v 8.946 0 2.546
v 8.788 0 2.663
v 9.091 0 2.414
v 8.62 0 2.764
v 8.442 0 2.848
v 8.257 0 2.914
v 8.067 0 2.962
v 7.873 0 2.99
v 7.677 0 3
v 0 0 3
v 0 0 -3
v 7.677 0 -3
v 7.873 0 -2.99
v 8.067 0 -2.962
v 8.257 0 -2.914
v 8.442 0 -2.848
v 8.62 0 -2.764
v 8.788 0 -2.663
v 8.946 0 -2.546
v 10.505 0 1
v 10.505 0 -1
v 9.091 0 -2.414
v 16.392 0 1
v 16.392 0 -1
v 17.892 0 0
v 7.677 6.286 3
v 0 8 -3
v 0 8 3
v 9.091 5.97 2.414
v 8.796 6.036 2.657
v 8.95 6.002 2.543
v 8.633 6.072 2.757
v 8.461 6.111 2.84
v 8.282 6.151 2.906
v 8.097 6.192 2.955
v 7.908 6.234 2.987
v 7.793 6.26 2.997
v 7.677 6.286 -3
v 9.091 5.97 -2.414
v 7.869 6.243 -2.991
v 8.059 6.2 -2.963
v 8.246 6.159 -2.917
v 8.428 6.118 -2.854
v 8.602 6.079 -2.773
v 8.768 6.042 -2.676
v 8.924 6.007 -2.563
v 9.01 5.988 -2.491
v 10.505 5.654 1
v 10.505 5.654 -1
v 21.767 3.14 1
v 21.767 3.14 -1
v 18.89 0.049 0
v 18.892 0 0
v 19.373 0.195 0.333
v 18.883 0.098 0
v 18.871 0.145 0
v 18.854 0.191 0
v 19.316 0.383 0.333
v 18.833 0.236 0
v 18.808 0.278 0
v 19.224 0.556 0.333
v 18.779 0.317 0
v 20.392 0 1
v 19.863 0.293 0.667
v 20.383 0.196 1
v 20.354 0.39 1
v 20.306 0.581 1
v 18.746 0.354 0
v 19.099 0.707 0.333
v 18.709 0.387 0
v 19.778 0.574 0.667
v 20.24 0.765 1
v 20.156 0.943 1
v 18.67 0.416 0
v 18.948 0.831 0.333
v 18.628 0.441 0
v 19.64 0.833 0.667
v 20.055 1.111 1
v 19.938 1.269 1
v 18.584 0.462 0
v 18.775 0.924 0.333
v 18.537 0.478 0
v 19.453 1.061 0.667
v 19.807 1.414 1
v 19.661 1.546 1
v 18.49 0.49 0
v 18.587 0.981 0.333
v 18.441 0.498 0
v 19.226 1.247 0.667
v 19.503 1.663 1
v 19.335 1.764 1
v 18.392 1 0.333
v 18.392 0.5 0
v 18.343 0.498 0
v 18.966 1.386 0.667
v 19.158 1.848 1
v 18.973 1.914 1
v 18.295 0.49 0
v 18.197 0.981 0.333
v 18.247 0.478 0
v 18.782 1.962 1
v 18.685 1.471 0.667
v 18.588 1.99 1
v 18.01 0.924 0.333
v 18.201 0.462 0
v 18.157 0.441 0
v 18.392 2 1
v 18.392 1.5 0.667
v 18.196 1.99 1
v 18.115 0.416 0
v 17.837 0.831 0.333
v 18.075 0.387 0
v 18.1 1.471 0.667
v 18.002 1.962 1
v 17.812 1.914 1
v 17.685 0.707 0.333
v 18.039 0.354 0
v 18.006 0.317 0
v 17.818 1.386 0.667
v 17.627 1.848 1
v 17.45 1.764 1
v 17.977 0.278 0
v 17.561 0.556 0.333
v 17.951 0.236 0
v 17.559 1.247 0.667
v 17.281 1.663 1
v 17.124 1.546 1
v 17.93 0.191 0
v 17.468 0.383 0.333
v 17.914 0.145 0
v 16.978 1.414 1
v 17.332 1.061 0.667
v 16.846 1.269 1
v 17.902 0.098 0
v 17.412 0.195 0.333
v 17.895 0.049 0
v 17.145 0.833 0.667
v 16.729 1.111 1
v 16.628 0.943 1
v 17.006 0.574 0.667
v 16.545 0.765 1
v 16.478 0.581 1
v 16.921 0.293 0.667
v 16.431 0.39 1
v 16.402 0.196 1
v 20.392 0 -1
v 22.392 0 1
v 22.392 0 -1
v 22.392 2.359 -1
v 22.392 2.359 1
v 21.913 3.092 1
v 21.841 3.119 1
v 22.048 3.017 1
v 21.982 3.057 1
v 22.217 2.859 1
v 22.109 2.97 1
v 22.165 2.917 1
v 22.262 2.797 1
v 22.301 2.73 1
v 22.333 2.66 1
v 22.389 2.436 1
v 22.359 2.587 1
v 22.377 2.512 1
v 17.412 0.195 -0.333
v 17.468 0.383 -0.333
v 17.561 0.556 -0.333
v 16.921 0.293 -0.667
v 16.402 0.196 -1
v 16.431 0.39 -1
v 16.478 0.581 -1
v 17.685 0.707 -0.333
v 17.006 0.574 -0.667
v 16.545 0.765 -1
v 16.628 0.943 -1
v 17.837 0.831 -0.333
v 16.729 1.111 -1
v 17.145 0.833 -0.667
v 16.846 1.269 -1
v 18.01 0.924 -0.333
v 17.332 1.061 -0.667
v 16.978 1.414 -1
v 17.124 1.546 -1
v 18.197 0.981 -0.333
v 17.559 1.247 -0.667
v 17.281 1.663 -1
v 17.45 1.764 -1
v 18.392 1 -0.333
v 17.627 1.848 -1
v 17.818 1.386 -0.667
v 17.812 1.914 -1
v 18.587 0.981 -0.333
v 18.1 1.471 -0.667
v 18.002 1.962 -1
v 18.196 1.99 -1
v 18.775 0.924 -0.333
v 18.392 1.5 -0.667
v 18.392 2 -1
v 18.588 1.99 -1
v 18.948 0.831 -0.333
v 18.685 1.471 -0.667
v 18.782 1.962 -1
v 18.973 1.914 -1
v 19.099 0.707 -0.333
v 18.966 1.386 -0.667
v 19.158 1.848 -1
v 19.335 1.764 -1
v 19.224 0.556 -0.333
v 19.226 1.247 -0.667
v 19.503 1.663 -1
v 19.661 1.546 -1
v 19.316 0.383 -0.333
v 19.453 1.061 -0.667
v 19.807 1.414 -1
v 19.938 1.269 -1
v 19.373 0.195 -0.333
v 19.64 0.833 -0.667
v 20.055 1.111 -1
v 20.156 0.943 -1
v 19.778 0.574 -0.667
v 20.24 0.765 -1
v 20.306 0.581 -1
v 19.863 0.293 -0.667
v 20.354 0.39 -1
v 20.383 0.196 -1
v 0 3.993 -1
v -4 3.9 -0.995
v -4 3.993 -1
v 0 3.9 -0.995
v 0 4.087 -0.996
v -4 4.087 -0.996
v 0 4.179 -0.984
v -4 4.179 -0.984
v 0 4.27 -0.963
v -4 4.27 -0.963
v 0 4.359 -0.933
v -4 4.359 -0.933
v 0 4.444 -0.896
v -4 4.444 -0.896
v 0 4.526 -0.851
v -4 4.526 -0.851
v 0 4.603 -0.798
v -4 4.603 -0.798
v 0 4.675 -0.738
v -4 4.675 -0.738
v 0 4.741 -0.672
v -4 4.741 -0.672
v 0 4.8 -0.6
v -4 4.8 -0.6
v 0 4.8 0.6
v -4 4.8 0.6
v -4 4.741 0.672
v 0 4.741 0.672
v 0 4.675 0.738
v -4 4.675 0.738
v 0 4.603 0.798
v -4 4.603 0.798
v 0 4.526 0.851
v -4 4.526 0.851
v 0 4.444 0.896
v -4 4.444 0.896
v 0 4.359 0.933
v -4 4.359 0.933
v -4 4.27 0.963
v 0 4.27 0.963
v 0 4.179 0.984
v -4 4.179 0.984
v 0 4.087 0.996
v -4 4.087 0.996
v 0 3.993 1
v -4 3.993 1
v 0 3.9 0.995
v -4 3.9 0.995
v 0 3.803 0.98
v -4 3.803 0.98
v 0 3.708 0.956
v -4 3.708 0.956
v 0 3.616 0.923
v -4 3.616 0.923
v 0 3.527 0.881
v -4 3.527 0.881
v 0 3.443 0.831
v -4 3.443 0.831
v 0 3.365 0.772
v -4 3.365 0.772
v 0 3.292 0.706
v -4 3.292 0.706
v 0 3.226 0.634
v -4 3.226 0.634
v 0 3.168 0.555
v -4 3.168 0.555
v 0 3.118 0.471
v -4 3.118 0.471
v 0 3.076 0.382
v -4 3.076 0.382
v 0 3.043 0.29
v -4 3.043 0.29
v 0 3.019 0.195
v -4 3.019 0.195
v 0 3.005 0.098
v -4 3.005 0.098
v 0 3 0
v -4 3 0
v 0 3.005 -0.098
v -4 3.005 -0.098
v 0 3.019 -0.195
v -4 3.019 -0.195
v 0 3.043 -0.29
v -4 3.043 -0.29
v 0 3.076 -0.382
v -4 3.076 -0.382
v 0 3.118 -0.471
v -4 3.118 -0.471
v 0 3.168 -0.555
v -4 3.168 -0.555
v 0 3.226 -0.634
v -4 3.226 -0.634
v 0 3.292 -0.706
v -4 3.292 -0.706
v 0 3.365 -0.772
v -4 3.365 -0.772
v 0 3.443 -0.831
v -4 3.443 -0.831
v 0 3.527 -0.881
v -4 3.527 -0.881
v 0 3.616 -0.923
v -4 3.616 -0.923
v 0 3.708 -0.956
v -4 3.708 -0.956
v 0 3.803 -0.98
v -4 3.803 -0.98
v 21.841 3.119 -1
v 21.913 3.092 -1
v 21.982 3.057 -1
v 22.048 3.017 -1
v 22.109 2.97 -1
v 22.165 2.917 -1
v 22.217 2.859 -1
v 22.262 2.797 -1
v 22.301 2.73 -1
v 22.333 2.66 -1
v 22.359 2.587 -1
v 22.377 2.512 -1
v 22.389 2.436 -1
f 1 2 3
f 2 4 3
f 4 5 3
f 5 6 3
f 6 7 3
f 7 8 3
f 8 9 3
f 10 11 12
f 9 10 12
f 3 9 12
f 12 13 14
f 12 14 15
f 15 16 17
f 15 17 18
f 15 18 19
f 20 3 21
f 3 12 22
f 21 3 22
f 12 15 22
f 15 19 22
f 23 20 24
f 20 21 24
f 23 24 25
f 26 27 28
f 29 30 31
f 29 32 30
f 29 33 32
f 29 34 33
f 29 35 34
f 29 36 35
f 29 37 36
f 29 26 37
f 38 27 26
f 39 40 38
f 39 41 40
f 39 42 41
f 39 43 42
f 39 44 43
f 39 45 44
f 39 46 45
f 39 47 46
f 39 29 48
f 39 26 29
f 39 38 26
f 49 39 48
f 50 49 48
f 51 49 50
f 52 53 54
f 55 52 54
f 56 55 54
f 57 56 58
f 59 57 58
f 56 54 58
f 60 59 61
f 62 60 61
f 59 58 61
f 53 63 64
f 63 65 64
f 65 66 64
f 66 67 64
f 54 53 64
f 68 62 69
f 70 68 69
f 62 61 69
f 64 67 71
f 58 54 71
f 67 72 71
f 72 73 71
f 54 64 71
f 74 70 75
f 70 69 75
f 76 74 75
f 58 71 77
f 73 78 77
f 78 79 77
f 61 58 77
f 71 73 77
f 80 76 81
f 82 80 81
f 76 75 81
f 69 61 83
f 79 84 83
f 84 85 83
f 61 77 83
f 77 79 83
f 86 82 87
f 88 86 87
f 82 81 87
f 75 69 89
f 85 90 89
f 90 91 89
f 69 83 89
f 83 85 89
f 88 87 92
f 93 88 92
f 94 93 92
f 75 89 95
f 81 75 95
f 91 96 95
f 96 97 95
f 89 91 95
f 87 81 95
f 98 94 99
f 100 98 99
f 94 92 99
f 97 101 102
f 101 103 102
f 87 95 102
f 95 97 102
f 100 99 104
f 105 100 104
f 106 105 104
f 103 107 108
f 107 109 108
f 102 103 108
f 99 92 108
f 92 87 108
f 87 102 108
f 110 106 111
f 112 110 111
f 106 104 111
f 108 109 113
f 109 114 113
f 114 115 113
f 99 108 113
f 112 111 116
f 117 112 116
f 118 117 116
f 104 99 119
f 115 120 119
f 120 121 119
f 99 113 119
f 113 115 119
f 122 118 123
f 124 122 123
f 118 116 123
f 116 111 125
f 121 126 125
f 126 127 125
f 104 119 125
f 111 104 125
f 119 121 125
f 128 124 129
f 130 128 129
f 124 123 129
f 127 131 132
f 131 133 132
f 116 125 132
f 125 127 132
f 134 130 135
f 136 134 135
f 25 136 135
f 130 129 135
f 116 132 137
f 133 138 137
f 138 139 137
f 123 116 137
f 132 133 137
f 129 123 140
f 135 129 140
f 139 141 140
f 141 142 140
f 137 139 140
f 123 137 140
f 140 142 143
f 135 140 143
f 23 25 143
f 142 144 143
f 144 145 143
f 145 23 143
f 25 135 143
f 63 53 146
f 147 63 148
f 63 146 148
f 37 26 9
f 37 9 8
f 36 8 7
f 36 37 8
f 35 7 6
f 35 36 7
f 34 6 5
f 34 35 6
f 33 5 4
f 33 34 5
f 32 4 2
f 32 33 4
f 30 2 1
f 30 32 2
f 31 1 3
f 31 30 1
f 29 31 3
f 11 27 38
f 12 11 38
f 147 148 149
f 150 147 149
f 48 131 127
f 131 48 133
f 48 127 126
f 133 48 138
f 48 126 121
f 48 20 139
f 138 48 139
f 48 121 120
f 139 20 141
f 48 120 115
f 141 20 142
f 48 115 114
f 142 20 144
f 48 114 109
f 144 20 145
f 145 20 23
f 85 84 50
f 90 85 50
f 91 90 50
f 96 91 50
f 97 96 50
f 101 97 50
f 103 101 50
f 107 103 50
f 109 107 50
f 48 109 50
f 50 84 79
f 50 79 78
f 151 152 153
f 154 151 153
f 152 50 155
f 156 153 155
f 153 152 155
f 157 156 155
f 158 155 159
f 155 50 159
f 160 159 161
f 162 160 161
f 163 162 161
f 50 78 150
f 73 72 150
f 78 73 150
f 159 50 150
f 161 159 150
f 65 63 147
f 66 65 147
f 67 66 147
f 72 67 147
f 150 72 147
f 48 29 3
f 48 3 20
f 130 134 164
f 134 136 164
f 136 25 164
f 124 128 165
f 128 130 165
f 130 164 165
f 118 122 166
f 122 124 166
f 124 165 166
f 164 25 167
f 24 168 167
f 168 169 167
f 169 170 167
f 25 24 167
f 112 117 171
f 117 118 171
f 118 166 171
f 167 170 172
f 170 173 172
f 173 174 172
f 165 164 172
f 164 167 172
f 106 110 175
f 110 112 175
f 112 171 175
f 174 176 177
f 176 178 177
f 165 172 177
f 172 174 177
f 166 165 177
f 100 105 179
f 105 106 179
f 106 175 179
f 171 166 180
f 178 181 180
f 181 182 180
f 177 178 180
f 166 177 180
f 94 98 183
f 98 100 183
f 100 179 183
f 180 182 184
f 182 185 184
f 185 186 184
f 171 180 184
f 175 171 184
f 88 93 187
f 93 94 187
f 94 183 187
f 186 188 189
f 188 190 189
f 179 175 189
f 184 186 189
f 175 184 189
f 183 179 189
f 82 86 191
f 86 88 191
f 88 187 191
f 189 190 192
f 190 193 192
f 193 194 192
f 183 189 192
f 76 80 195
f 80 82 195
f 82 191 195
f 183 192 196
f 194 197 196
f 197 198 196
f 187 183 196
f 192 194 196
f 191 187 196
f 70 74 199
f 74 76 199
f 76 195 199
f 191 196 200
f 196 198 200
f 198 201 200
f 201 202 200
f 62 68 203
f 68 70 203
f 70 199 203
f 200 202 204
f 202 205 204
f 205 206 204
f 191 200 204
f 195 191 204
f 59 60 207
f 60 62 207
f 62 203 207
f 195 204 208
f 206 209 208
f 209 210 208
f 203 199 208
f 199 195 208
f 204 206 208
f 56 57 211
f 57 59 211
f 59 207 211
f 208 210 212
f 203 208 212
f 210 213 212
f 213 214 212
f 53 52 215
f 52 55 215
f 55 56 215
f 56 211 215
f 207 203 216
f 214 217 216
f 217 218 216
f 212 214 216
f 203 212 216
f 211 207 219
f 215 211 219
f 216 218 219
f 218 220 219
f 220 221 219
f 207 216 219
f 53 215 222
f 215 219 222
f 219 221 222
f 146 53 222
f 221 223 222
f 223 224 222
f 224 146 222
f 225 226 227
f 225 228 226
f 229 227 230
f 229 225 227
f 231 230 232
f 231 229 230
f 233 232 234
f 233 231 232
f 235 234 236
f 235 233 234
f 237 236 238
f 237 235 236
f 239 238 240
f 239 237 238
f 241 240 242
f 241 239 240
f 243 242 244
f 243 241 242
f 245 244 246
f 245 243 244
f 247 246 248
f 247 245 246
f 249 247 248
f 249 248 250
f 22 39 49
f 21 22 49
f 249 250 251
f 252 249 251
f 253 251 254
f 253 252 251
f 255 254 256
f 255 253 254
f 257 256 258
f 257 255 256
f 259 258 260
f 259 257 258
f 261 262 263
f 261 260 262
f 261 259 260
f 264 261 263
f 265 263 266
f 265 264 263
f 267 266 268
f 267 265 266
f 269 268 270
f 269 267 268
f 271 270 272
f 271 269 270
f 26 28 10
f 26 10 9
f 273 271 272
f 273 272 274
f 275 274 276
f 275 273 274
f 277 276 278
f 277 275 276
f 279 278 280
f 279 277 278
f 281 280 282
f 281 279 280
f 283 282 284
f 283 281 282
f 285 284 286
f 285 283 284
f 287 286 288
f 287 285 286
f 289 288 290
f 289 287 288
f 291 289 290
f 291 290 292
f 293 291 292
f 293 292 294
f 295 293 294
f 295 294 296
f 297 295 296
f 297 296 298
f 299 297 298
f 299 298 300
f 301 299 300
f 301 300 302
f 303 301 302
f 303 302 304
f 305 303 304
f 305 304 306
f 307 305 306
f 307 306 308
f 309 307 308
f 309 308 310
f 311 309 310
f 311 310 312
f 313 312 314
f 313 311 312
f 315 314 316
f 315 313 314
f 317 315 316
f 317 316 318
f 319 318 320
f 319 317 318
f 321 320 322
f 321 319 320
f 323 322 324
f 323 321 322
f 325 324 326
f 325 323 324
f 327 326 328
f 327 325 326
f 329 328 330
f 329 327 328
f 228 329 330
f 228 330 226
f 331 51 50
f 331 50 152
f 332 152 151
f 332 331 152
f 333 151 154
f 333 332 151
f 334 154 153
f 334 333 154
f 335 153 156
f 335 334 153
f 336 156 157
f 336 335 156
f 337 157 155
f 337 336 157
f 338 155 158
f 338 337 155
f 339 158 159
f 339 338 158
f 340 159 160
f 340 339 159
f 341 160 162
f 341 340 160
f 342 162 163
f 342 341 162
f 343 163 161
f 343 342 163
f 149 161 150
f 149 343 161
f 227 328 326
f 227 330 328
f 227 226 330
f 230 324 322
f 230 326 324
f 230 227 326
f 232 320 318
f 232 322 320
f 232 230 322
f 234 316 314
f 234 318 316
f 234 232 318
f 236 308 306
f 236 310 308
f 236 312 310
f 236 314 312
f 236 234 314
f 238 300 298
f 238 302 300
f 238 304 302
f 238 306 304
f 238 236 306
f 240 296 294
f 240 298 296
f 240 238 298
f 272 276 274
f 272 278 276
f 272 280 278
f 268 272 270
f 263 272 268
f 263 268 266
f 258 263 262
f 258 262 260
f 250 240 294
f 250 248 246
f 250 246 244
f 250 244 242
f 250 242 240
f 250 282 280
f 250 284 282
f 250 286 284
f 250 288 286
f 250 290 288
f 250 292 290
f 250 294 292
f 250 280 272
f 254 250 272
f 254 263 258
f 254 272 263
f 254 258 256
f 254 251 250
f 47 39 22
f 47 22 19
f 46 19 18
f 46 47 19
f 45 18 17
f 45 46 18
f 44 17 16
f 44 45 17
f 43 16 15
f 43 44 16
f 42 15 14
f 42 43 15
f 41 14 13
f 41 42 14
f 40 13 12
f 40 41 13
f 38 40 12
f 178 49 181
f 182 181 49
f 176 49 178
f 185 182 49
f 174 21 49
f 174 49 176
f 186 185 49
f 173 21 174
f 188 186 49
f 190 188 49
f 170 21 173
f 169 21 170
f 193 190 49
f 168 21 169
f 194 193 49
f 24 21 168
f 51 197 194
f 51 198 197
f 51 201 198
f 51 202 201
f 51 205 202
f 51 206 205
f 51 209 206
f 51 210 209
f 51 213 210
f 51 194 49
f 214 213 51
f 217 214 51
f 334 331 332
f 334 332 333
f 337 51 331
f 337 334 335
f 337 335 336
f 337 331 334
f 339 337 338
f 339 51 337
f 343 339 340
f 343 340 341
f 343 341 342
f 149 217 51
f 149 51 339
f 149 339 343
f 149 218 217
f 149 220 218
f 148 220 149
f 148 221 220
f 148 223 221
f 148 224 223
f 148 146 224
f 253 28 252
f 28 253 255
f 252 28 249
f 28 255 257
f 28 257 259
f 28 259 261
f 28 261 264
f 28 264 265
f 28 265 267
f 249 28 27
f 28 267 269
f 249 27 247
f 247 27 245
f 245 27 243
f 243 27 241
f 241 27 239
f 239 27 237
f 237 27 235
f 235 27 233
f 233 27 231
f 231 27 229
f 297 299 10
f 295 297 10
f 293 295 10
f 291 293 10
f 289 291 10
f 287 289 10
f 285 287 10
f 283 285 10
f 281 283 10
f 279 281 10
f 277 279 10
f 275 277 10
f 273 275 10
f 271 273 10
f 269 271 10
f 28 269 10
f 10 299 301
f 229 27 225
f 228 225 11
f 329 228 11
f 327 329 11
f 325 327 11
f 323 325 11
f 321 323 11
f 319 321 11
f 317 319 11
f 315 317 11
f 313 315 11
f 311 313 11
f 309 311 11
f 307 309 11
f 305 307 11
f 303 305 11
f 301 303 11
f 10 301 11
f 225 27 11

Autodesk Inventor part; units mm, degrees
ref_plane "YZ Plane" through (0, 0, 0) normal (1, 0, 0) x (0, 1, 0)
sketch "Sketch1" plane through (0, 0, 0) normal (0, 0, 1) x (1, 0, 0)
  line L0 (0, 8) -> (22.3923, 3)
  line L1 (22.3923, 0) -> (22.3923, 3)
  line L2 (0, 0) -> (22.3923, 0)
  line L3 (0, 8) -> (0, 0)
  dimension "d5" = 3
  dimension "d7" = 8
  dimension "d59" = 22.3923
extrude "Extrusion1" add sketch "Sketch1" along normal mid plane 6
sketch "Sketch2" plane through (0, 0, 3) normal (-1, 0, 0) x (0, 0, 1)
  line L0 (-6, 0) -> (-6, 8) projected
  line L1 (0, 3) -> (0, 8) projected
  line L2 (-6, 0) -> (0, 8)
  line L3 (-6, 8) -> (0, 8) projected
  line L4 (0, 8) -> (0, 0) projected
  line L5 (-6, 8) -> (0, 0)
  arc A0 (-3.995, 3.9001) -> (-2.005, 3.9001) centre (-3, 4) ccw
  line L6 (-3.6, 4.8) -> (-2.4, 4.8)
  arc A1 (-2.005, 3.9001) -> (-2.4, 4.8) centre (-3, 4) ccw
  arc A2 (-3.6, 4.8) -> (-3.9949, 3.8993) centre (-3, 4) ccw
  point P0 (-3, 0)
extrude "Extrusion2" add sketch "Sketch2" along normal blind 4 contours A0 A2 L5 L2 | L2 L5 A0 | L6 L2 L5 | L2 A1 A0 L5
sketch "Sketch3" plane through (0, 0, 3) normal (0, -1, 0) x (1, 0, 0)
  line L0 (22.3923, -6) -> (0, -6) projected
  line L1 (8.5053, -6) -> (10.5053, -4)
  line L2 (10.5053, -4) -> (22.3923, -4)
  line L3 (22.3923, 0) -> (22.3923, -6) projected
  line L4 (22.3923, -4) -> (22.3923, -6)
  line L5 (22.3923, -6) -> (8.5053, -6)
  line L6 (8.5053, 0) -> (10.5053, -2)
  line L7 (10.5053, -2) -> (22.3923, -2)
  line L8 (22.3923, -2) -> (22.3923, 5.9236)
  line L9 (22.3923, 0) -> (0, 0) projected
  line L10 (8.5053, 0) -> (22.3923, 0)
  point P0 (0, -3)
  dimension "d13" = 2
  dimension "d14" = 2
  dimension "d15" = 45
extrude "Extrusion3" cut sketch "Sketch3" against normal through all
ref_plane "Work Plane2" through (15.7073, 3, 0) normal (-1, 0, 0) x (0, 0, -1)
ref_plane "Work Plane1" through (22.3923, 3, 0) normal (-1, 0, 0) x (0, 0, -1)
fillet "Fillet8" radius 2 1 edges at (8.5053, 3.0504, 3)
fillet "Fillet9" radius 2 1 edges at (8.5053, 3.0504, -3)
fillet "Fillet11" radius 0.8 1 edges at (22.3923, 3, 0)
sketch "Sketch13" plane through (10.5053, 0, 1) normal (0, 0, 1) x (1, 0, 0)
  line L0 (0, 0) -> (11.887, 0) projected
  arc A0 (9.887, 0) -> (5.887, 0) centre (7.887, 0) ccw
  point P0 (-10.5053, 0)
  dimension "d86" = 4
  dimension "d88" = 4
ref_plane "Work Plane5" through (10.5053, 0, 0) normal (0, 0, 1) x (1, 0, 0)
sketch "Sketch14" plane through (10.5053, 0, 0) normal (0, 0, 1) x (1, 0, 0)
  line L0 (0, 0) -> (11.887, 0) projected
  arc A0 (8.387, 0) -> (7.387, 0) centre (7.887, 0) ccw
  point P0 (-10.5053, 0)
  dimension "d89" = 4
  dimension "d90" = 1
loft "Loft1" cut profiles "Sketch13", "Sketch14"
sketch "Sketch16" plane through (22.3923, 0, -1) normal (0, 0, -1) x (-1, 0, 0)
  arc A0 (6, 0) -> (2, 0) centre (4, 0) ccw
  line L0 (0, 0) -> (2, 0) projected
  line L1 (6, 0) -> (11.887, 0) projected
  line L2 (2, 0) -> (6, 0)
  line L3 (11.887, 0) -> (0, 0) projected
  point P0 (22.3923, 0)
  dimension "d98" = 4
  dimension "d99" = 4
sketch "Sketch17" plane through (10.5053, 0, 0) normal (0, 0, 1) x (1, 0, 0)
  line L0 (11.887, 2.3589) -> (11.887, 0) projected
  line L1 (9.887, 0) -> (8.387, 0) projected
  line L2 (8.8124, 0) -> (7.1201, 0)
  arc A0 (8.387, 0) -> (7.387, 0) centre (7.887, 0) ccw
  point P0 (-10.5053, 0)
  dimension "d102" = 4
  dimension "d103" = 1
loft "Loft2" cut profiles "Sketch16" section 2 edges at (18.3923, 0.5, 0) (18.3923, 0, 0)
properties part number "blade" material "Stainless Steel"
